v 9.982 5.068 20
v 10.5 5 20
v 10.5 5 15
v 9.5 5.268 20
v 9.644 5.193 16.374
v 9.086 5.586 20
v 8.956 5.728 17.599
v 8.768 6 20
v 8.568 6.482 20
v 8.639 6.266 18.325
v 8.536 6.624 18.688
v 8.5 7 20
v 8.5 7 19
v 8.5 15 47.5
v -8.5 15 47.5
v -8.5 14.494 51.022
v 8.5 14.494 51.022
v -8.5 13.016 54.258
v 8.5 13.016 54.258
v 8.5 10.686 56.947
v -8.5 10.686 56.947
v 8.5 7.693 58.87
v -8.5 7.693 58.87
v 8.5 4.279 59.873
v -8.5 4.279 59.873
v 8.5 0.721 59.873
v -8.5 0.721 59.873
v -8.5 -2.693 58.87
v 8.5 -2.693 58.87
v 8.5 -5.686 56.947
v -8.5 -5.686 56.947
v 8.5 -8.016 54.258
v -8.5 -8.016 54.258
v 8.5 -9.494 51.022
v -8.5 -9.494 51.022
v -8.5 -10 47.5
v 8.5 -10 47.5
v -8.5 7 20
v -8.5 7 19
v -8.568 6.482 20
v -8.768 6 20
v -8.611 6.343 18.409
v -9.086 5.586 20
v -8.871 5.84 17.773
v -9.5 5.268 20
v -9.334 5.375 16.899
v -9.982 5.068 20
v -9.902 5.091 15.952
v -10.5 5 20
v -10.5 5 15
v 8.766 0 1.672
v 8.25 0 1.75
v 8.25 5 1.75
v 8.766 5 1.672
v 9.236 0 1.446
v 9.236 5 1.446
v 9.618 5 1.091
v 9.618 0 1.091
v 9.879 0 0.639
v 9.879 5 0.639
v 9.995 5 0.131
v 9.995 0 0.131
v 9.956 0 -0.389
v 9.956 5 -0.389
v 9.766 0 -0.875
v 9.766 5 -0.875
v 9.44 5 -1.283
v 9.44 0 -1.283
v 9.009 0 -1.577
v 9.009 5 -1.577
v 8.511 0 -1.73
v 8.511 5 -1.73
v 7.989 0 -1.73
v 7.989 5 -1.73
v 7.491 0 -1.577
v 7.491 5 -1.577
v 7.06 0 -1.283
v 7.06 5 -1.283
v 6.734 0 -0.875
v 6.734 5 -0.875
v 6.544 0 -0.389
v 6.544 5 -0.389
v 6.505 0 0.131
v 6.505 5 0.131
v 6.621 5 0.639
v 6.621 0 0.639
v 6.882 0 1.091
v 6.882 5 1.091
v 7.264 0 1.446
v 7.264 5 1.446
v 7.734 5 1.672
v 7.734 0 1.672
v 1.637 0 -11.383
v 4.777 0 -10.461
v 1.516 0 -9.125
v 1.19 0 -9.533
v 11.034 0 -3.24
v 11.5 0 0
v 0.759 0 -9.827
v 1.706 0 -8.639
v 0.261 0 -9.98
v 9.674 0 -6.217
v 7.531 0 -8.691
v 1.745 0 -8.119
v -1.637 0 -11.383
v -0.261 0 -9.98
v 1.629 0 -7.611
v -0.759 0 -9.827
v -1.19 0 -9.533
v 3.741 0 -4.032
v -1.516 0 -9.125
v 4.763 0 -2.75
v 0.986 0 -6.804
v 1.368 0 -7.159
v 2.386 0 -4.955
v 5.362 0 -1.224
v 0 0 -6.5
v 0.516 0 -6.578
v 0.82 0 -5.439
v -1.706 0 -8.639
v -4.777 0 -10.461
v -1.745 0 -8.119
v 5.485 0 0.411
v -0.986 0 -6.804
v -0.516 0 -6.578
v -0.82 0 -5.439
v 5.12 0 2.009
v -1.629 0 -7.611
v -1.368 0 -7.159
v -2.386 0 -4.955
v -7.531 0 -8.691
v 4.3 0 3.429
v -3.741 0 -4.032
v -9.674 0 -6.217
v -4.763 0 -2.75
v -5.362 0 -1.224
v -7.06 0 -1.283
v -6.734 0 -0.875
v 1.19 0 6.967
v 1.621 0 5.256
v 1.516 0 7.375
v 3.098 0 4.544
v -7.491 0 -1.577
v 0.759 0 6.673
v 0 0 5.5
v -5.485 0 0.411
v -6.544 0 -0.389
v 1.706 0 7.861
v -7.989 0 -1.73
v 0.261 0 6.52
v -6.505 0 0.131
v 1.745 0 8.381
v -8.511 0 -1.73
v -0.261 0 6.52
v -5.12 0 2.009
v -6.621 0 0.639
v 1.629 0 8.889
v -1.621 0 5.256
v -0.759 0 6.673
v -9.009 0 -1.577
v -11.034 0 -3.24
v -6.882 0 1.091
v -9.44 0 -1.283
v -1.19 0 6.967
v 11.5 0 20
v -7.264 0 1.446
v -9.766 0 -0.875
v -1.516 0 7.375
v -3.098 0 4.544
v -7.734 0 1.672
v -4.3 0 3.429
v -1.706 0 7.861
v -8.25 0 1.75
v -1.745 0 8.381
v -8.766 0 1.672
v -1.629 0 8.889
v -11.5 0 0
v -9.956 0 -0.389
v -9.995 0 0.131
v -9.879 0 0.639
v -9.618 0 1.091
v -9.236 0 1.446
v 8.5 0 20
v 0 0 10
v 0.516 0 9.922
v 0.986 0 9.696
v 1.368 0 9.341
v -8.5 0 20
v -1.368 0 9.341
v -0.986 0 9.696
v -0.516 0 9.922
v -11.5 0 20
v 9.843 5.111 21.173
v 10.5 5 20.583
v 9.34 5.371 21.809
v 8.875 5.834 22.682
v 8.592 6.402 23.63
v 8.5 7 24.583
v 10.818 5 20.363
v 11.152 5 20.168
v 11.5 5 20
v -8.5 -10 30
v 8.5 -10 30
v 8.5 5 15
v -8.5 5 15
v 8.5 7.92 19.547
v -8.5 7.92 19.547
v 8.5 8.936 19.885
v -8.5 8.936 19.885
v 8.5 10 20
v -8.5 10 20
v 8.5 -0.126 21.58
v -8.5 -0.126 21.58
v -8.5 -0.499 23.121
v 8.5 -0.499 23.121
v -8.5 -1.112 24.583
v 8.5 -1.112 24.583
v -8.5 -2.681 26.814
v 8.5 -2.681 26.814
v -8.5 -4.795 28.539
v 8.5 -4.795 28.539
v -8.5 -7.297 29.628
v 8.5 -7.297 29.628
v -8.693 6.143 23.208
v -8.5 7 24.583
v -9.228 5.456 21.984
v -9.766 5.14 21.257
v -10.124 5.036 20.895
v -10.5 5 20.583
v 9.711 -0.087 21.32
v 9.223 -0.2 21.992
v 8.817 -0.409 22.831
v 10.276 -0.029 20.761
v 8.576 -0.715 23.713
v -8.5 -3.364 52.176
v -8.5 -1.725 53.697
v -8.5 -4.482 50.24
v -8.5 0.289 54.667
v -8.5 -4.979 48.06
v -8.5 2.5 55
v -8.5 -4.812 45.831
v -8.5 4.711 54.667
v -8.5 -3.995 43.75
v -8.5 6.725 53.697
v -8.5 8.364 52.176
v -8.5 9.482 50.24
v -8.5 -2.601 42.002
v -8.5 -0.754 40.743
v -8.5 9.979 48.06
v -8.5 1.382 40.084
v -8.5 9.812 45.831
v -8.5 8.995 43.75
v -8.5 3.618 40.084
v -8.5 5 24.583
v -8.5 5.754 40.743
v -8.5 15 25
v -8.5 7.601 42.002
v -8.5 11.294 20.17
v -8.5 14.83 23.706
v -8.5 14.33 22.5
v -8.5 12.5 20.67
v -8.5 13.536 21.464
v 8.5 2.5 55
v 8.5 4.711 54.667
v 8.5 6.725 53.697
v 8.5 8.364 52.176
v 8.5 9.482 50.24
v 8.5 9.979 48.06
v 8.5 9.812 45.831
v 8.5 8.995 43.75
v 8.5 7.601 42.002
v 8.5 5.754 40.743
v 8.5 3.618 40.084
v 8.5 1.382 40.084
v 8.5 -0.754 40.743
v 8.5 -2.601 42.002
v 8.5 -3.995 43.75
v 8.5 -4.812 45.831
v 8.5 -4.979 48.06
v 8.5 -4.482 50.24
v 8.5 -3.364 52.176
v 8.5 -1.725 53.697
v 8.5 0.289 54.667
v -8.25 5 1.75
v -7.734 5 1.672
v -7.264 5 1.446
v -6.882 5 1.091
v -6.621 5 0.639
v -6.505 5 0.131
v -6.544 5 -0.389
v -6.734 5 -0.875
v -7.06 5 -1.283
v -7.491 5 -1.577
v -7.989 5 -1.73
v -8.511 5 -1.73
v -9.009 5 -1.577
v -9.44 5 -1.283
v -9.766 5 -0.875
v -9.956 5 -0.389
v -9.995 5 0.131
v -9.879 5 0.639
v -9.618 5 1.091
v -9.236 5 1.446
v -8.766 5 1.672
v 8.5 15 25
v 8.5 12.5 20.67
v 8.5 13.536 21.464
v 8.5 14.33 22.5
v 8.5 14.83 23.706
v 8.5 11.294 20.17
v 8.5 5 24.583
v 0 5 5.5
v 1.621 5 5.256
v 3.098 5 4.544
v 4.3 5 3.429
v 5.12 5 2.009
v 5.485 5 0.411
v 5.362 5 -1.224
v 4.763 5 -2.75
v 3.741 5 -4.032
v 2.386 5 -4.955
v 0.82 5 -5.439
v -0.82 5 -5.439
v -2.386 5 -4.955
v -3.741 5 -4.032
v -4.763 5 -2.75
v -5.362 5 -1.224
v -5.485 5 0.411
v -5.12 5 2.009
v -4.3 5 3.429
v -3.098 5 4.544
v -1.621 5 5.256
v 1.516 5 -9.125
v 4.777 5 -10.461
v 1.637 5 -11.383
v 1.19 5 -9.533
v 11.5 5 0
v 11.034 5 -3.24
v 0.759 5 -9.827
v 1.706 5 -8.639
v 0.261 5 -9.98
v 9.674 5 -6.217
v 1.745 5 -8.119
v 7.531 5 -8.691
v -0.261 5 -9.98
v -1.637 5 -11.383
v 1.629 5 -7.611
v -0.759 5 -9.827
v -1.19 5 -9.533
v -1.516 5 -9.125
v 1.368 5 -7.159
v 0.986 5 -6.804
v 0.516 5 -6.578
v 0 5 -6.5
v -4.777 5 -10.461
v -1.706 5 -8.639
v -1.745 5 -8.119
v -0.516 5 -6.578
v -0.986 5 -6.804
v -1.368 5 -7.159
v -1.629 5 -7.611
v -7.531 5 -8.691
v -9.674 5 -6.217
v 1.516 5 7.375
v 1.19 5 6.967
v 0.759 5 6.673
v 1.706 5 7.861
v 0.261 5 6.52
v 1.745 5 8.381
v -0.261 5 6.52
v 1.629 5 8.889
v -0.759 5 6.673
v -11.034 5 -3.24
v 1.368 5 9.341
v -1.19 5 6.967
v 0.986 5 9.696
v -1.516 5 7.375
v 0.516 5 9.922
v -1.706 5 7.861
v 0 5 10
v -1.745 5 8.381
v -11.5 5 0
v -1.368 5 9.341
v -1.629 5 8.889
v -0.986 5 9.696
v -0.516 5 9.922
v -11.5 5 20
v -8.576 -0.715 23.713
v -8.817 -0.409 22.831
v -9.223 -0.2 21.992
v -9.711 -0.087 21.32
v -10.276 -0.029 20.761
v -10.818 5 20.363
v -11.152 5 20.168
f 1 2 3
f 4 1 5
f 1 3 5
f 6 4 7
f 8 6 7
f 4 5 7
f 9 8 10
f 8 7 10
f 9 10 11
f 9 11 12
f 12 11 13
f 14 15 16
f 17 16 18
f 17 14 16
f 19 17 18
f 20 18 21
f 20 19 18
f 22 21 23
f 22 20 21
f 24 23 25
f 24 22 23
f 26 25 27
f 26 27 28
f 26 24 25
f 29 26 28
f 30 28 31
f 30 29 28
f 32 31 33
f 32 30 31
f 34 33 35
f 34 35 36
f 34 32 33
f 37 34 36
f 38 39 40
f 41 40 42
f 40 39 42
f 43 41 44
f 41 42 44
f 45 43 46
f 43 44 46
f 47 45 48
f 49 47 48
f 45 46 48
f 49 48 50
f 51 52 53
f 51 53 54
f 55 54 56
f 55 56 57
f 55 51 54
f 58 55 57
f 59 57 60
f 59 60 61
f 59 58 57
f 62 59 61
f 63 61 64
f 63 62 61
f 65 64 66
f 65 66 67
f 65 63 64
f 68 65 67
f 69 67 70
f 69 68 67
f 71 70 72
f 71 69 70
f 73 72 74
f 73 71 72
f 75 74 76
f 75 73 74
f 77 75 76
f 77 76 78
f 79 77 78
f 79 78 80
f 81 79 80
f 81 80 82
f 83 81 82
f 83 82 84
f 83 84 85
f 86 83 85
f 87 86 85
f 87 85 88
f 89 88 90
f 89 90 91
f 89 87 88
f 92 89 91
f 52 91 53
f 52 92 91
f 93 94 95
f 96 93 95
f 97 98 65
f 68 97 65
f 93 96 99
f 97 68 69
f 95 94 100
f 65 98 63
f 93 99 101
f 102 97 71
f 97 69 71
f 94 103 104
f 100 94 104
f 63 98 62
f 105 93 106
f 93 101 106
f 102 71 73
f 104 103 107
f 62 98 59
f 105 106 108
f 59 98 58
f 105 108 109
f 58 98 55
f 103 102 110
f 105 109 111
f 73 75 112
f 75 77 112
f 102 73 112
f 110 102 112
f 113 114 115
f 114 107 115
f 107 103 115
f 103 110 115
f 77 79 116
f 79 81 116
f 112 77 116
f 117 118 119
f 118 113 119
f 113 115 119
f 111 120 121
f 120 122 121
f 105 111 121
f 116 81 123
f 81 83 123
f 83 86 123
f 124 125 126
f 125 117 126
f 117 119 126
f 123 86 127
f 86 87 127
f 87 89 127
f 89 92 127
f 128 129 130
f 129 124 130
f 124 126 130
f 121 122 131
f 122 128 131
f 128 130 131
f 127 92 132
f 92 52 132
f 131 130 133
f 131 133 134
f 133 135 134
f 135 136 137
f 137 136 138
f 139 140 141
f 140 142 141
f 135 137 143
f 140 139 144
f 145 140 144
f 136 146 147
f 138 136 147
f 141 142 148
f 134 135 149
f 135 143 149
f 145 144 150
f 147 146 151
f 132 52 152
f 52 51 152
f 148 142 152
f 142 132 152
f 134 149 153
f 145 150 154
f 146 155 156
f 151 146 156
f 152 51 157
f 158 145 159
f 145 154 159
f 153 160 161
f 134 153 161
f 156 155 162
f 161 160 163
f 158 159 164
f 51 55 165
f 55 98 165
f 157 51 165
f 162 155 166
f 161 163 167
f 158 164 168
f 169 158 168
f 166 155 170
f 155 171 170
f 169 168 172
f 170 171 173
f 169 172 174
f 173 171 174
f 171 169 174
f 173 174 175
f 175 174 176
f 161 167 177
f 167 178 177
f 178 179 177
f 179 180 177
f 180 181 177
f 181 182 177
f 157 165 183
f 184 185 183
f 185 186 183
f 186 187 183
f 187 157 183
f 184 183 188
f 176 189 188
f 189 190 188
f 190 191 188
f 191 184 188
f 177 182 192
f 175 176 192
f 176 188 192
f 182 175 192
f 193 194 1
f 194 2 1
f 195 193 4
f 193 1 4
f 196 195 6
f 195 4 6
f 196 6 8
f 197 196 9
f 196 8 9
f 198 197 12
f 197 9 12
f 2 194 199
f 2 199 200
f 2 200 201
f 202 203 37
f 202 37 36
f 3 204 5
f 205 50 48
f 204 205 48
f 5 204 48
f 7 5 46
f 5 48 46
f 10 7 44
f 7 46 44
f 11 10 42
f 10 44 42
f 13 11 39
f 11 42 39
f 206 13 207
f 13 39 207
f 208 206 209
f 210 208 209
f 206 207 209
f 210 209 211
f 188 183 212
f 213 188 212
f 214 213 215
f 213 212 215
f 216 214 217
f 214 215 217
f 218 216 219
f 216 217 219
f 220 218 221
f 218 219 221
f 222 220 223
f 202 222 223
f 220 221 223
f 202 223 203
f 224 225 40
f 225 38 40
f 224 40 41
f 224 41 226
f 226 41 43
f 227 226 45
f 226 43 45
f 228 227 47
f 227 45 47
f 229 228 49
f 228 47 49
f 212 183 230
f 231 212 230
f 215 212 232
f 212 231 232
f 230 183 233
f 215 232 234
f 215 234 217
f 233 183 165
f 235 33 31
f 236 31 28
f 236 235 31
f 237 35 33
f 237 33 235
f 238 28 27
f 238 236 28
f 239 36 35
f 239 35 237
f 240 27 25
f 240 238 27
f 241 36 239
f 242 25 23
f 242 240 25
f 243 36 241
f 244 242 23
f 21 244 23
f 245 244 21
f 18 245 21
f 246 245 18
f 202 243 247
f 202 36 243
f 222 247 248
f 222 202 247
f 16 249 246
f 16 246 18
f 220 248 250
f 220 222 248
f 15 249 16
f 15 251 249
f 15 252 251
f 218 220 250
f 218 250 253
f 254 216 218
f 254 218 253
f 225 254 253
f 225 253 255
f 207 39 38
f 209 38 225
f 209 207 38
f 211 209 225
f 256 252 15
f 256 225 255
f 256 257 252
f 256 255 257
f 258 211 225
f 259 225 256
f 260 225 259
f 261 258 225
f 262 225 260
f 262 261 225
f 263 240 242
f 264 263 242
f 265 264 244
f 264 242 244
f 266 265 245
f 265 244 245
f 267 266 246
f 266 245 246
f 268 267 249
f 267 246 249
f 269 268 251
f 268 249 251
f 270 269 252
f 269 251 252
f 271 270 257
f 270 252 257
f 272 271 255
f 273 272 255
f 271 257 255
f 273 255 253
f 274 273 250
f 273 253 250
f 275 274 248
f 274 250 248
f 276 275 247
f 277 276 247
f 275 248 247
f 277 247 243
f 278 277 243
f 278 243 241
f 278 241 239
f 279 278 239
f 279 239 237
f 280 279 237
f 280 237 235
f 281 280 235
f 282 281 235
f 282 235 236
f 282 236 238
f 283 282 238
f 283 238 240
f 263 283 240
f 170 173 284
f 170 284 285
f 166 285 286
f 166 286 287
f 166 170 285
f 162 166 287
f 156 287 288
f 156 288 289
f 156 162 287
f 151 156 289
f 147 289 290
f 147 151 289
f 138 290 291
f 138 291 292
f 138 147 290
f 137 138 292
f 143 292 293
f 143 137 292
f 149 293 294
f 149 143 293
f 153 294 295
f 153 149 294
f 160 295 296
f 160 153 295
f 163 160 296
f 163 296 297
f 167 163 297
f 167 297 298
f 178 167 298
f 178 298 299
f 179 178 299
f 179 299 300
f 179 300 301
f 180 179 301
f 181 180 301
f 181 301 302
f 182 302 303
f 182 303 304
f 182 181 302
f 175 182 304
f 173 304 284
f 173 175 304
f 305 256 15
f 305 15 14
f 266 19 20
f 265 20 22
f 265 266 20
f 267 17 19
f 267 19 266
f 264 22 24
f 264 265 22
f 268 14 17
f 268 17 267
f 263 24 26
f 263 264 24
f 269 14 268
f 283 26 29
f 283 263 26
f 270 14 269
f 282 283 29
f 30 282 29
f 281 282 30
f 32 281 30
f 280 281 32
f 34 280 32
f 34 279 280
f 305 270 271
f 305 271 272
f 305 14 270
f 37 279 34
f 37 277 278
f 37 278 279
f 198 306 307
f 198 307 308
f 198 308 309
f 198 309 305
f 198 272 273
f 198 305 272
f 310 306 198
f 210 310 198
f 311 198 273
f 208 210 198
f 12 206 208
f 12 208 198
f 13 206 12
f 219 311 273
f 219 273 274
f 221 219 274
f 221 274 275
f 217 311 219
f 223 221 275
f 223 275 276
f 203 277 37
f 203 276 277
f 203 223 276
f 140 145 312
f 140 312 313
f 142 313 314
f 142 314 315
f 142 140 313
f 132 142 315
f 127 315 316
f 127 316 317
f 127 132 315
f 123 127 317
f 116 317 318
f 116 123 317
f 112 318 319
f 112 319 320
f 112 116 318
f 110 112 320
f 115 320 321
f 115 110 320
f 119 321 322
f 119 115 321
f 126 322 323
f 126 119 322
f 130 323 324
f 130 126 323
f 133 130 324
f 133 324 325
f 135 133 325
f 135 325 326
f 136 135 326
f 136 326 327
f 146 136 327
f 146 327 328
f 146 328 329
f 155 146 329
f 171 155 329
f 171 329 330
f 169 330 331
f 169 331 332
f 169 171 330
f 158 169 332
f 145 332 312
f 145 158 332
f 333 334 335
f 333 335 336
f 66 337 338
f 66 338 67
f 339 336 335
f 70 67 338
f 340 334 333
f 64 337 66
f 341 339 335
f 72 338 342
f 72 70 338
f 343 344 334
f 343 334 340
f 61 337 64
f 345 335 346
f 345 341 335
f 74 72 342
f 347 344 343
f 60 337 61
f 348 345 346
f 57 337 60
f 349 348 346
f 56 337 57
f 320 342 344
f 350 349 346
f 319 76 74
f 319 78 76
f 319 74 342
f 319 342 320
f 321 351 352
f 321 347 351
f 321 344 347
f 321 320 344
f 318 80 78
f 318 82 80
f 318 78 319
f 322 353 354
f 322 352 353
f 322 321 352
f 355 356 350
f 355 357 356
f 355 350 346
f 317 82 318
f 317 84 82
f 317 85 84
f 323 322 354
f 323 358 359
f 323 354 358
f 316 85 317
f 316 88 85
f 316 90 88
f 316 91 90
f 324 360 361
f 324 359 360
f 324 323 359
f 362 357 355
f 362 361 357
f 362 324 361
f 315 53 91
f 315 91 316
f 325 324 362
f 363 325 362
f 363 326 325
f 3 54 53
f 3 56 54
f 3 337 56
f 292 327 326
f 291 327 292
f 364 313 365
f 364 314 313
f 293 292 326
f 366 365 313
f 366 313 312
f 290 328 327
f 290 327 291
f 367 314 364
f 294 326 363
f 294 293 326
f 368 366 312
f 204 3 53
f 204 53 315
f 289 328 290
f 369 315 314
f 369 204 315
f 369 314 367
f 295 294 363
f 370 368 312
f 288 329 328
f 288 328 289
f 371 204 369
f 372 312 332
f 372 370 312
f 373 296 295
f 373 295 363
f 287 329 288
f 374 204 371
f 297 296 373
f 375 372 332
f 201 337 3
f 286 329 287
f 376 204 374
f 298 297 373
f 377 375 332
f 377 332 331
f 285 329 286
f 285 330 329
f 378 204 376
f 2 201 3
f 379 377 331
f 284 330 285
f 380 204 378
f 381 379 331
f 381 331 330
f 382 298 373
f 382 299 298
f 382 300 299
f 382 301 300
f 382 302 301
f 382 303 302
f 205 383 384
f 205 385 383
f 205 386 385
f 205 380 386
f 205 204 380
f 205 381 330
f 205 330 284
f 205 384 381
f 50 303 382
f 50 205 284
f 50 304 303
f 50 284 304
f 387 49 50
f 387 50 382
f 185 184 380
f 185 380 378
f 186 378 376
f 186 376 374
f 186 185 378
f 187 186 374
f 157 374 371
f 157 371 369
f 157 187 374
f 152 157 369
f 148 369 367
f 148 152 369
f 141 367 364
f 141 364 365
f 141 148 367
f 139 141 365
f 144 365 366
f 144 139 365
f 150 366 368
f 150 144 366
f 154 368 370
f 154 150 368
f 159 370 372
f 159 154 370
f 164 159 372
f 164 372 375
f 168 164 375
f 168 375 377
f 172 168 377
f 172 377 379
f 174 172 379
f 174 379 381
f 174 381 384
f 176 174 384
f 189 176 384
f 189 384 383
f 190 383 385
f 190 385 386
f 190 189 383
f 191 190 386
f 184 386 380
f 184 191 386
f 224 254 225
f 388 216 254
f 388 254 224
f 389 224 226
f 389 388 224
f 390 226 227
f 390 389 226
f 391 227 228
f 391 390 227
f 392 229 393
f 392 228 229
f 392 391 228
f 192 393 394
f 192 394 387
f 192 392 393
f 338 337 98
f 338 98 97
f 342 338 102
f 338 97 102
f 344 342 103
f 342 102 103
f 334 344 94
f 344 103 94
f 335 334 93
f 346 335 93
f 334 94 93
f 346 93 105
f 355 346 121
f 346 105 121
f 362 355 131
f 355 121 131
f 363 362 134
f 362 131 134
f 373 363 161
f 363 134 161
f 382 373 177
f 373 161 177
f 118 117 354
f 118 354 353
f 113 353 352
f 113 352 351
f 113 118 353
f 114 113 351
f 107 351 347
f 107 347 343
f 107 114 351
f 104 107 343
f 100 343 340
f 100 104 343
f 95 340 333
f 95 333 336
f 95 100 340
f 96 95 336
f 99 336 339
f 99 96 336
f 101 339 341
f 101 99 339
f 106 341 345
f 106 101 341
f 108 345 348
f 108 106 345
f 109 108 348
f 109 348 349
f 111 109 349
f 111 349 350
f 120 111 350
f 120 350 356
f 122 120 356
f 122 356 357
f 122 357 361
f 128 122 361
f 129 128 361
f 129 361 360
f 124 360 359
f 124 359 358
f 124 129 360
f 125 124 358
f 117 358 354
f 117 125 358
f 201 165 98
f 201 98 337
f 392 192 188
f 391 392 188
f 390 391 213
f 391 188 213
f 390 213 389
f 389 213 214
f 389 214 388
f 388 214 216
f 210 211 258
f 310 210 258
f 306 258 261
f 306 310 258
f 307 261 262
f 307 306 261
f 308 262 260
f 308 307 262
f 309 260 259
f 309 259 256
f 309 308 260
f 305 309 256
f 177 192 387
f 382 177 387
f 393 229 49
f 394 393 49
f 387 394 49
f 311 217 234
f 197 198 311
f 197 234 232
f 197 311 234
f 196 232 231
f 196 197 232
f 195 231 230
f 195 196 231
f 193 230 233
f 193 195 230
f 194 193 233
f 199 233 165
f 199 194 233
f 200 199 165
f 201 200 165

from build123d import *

# Parameters (mm, degrees)
SKETCH1_R           = 11.5
SKETCH1_R_2         = 5.5
SKETCH1_R_3         = 1.75
SKETCH1_R_4         = 1.7499999999999998
EXTRUDE1_DEPTH      = 5
EXTRUDE2_DEPTH      = 40
FILLET1_RADIUS      = 12.5
FILLET1_LENGTH      = 17
EXTRUDE4_REACH      = 46.241
EXTRUDE4_END_RADIUS = 11.5
SKETCH4_W           = 23
SKETCH4_H           = 5
SKETCH5_R           = 7.499999999999999
EXTRUDE5_DEPTH      = 66
FILLET2_R           = 5
EXTRUDE6_DEPTH      = 66
EXTRUDE6_DEPTH_BACK = 66
FILLET3_R           = 5
FILLET4_R           = 2


# Some blends are built 0.0001 mm under size
with BuildPart() as part:
    # Sketch1 → Extrude1 (new body)
    with BuildSketch(Plane(origin=(0, 0, 0), x_dir=(1, 0, 0), z_dir=(0, 1, 0))):
        with Locations(Location((0, 0, 0), (0, 0, 270))):
            Circle(SKETCH1_R)
        with Locations(Location((0, 0, 0), (0, 0, 270))):
            Circle(SKETCH1_R_2, mode=Mode.SUBTRACT)
        with Locations(Location((-8.25, 0, 0), (0, 0, 270))):
            Circle(SKETCH1_R_3, mode=Mode.SUBTRACT)
        with Locations(Location((2.88e-14, 8.249999999999998, 0), (0, 0, 270))):
            Circle(SKETCH1_R_3, mode=Mode.SUBTRACT)
        with Locations(Location((8.25, -5.761e-14, 0), (0, 0, 270))):
            Circle(SKETCH1_R_4, mode=Mode.SUBTRACT)
        with Locations(Location((-8.641e-14, -8.25, 0), (0, 0, 270))):
            Circle(SKETCH1_R_4, mode=Mode.SUBTRACT)
    extrude(amount=EXTRUDE1_DEPTH)



with BuildPart() as body_2:
    # Sketch2 → Extrude2 (new body)
    with BuildSketch(Plane.XY.offset(20)):
        Polygon((-8.5, 15.000000000000002), (8.499999999999996, 15.000000000000002), (8.500000000000002, -10), (-8.499999999999998, -10), align=None)
    extrude(amount=EXTRUDE2_DEPTH)

    # Fillet1: full round fillet: the end face becomes a half cylinder, R = half its width
    fillet1_face = Plane((0, 2.5, 60), x_dir=(1, 0, 0), z_dir=(0, 0, 1))  # on the end face: x along it, z out of the body
    fillet1_slab = fillet1_face.offset(-FILLET1_RADIUS / 2) * Box(FILLET1_LENGTH, 2 * FILLET1_RADIUS, FILLET1_RADIUS, mode=Mode.PRIVATE)  # the body's end, R deep
    fillet1_round = Plane((0, 2.5, 47.5), x_dir=(0, 0, 1), z_dir=(1, 0, 0)) * Cylinder(FILLET1_RADIUS, FILLET1_LENGTH, mode=Mode.PRIVATE)  # its axis R under the face
    add(fillet1_slab - fillet1_round, mode=Mode.SUBTRACT)


with BuildPart() as part_1:
    add(part.part)

    add(body_2.part)  # Extrude4 merges body 2
    # Extrude4: up to this cylinder (the profile starts outside it)
    extrude4_end = Plane(origin=(0, 2.5, 0), z_dir=(0, -1, 0)) * Cylinder(EXTRUDE4_END_RADIUS, 116.482, mode=Mode.PRIVATE)
    # Sketch4 → Extrude4 (add, up to the surface)
    with BuildSketch(Plane(origin=(0, 0, 20), x_dir=(-1, 0, 0), z_dir=(0, 0, -1)), mode=Mode.PRIVATE) as extrude4_sk1:
        with Locations((0, 2.5)):
            Rectangle(SKETCH4_W, SKETCH4_H)
    extrude4_tool1 = extrude(extrude4_sk1.sketch, amount=EXTRUDE4_REACH, mode=Mode.PRIVATE) - extrude4_end
    add(extrude4_tool1.solids().sort_by_distance((0, 2.5, 20))[0])

    # Sketch5 → Extrude5 (cut, through all)
    with BuildSketch(Plane.ZY.offset(8.499999999999998)):
        with Locations((47.5, 2.5000000000000004)):
            Circle(SKETCH5_R)
    extrude(amount=-EXTRUDE5_DEPTH, mode=Mode.SUBTRACT)

    # Fillet2
    fillet2_edges = [part_1.edges().sort_by_distance(p)[0] for p in [
        (0, 5, 20),
    ]]
    fillet(fillet2_edges, radius=FILLET2_R)
    fillet2_2_edges = [part_1.edges().sort_by_distance(p)[0] for p in [
        (-1.78e-15, 15.000000000000002, 20),
    ]]
    fillet(fillet2_2_edges, radius=FILLET2_R - 0.0001)  # a hair under: the kernel refuses the full size

    # Sketch6 → Extrude6 (cut, two sides: drawn at the far end of the back side and taken through both)
    with BuildSketch(Plane.ZY.offset(8.499999999999998).offset(-EXTRUDE6_DEPTH_BACK)):
        with BuildLine():
            Line((-86.89685237405806, -7.595e-14), (20, 0))
            ThreePointArc((20, 0), (27.071067811865476, -2.9289321881345254), (30, -10.000000000000002))
            Line((30, -10.000000000000002), (29.999999999999982, -116.89685237405806))
            Line((29.999999999999982, -116.89685237405806), (-121.17497840238745, -268.0718307764456))
            Line((-121.17497840238745, -268.0718307764456), (-238.0718307764455, -151.1749784023876))
            Line((-238.0718307764455, -151.1749784023876), (-86.89685237405806, -7.595e-14))
        make_face()
    extrude(amount=EXTRUDE6_DEPTH + EXTRUDE6_DEPTH_BACK, mode=Mode.SUBTRACT)

    # Fillet3
    # the kernel refuses this fillet: 5 mm, written as the material it adds along each edge
    with BuildSketch(Plane(origin=(8.499999999999998, 5, 20), x_dir=(0, 0, 1), z_dir=(2.1e-16, -1, 0))) as fillet3_piece_1_section:
        with BuildLine():
            CenterArc((4.5825756949558425, -5), FILLET3_R, 90, 66.4218215217982)
            Line((0, -3.0000000000000018), (0, 0))
            Line((0, 0), (4.5825756949558425, 0))
        make_face()
    fillet3_piece_1 = extrude(amount=16.45643923738961, mode=Mode.PRIVATE)
    fillet3_piece_1 = fillet3_piece_1 - Plane(origin=(9.308333267064283, -10.000000000000004, 19.999999999999996), x_dir=(0, 1, 3.6e-16), z_dir=(1, 0, 0)) * Cylinder(10.000000000000004, 52, mode=Mode.PRIVATE)
    add(fillet3_piece_1)
    with BuildSketch(Plane(origin=(-8.499999999999998, -11.456439237389606, 20), x_dir=(0, 0, 1), z_dir=(-7e-17, 1, 0))) as fillet3_piece_2_section:
        with BuildLine():
            CenterArc((4.5825756949558425, -5), FILLET3_R, 90, 66.4218215217982)
            Line((0, -3.0000000000000018), (0, 0))
            Line((0, 0), (4.5825756949558425, 0))
        make_face()
    fillet3_piece_2 = extrude(amount=16.456439237389606, mode=Mode.PRIVATE)
    fillet3_piece_2 = fillet3_piece_2 - Plane(origin=(-8.583224495068782, -10.000000000000004, 19.999999999999996), x_dir=(0, 1, 3.6e-16), z_dir=(1, 0, 0)) * Cylinder(10.000000000000004, 52, mode=Mode.PRIVATE)
    add(fillet3_piece_2)

    # Fillet4
    fillet4_edges = [part_1.edges().sort_by_distance(p)[0] for p in [
        (-8.5, 5, 19.791287847478),
        (8.5, 5, 19.791287847478),
    ]]
    fillet(fillet4_edges, radius=FILLET4_R)


solid = part_1.part
